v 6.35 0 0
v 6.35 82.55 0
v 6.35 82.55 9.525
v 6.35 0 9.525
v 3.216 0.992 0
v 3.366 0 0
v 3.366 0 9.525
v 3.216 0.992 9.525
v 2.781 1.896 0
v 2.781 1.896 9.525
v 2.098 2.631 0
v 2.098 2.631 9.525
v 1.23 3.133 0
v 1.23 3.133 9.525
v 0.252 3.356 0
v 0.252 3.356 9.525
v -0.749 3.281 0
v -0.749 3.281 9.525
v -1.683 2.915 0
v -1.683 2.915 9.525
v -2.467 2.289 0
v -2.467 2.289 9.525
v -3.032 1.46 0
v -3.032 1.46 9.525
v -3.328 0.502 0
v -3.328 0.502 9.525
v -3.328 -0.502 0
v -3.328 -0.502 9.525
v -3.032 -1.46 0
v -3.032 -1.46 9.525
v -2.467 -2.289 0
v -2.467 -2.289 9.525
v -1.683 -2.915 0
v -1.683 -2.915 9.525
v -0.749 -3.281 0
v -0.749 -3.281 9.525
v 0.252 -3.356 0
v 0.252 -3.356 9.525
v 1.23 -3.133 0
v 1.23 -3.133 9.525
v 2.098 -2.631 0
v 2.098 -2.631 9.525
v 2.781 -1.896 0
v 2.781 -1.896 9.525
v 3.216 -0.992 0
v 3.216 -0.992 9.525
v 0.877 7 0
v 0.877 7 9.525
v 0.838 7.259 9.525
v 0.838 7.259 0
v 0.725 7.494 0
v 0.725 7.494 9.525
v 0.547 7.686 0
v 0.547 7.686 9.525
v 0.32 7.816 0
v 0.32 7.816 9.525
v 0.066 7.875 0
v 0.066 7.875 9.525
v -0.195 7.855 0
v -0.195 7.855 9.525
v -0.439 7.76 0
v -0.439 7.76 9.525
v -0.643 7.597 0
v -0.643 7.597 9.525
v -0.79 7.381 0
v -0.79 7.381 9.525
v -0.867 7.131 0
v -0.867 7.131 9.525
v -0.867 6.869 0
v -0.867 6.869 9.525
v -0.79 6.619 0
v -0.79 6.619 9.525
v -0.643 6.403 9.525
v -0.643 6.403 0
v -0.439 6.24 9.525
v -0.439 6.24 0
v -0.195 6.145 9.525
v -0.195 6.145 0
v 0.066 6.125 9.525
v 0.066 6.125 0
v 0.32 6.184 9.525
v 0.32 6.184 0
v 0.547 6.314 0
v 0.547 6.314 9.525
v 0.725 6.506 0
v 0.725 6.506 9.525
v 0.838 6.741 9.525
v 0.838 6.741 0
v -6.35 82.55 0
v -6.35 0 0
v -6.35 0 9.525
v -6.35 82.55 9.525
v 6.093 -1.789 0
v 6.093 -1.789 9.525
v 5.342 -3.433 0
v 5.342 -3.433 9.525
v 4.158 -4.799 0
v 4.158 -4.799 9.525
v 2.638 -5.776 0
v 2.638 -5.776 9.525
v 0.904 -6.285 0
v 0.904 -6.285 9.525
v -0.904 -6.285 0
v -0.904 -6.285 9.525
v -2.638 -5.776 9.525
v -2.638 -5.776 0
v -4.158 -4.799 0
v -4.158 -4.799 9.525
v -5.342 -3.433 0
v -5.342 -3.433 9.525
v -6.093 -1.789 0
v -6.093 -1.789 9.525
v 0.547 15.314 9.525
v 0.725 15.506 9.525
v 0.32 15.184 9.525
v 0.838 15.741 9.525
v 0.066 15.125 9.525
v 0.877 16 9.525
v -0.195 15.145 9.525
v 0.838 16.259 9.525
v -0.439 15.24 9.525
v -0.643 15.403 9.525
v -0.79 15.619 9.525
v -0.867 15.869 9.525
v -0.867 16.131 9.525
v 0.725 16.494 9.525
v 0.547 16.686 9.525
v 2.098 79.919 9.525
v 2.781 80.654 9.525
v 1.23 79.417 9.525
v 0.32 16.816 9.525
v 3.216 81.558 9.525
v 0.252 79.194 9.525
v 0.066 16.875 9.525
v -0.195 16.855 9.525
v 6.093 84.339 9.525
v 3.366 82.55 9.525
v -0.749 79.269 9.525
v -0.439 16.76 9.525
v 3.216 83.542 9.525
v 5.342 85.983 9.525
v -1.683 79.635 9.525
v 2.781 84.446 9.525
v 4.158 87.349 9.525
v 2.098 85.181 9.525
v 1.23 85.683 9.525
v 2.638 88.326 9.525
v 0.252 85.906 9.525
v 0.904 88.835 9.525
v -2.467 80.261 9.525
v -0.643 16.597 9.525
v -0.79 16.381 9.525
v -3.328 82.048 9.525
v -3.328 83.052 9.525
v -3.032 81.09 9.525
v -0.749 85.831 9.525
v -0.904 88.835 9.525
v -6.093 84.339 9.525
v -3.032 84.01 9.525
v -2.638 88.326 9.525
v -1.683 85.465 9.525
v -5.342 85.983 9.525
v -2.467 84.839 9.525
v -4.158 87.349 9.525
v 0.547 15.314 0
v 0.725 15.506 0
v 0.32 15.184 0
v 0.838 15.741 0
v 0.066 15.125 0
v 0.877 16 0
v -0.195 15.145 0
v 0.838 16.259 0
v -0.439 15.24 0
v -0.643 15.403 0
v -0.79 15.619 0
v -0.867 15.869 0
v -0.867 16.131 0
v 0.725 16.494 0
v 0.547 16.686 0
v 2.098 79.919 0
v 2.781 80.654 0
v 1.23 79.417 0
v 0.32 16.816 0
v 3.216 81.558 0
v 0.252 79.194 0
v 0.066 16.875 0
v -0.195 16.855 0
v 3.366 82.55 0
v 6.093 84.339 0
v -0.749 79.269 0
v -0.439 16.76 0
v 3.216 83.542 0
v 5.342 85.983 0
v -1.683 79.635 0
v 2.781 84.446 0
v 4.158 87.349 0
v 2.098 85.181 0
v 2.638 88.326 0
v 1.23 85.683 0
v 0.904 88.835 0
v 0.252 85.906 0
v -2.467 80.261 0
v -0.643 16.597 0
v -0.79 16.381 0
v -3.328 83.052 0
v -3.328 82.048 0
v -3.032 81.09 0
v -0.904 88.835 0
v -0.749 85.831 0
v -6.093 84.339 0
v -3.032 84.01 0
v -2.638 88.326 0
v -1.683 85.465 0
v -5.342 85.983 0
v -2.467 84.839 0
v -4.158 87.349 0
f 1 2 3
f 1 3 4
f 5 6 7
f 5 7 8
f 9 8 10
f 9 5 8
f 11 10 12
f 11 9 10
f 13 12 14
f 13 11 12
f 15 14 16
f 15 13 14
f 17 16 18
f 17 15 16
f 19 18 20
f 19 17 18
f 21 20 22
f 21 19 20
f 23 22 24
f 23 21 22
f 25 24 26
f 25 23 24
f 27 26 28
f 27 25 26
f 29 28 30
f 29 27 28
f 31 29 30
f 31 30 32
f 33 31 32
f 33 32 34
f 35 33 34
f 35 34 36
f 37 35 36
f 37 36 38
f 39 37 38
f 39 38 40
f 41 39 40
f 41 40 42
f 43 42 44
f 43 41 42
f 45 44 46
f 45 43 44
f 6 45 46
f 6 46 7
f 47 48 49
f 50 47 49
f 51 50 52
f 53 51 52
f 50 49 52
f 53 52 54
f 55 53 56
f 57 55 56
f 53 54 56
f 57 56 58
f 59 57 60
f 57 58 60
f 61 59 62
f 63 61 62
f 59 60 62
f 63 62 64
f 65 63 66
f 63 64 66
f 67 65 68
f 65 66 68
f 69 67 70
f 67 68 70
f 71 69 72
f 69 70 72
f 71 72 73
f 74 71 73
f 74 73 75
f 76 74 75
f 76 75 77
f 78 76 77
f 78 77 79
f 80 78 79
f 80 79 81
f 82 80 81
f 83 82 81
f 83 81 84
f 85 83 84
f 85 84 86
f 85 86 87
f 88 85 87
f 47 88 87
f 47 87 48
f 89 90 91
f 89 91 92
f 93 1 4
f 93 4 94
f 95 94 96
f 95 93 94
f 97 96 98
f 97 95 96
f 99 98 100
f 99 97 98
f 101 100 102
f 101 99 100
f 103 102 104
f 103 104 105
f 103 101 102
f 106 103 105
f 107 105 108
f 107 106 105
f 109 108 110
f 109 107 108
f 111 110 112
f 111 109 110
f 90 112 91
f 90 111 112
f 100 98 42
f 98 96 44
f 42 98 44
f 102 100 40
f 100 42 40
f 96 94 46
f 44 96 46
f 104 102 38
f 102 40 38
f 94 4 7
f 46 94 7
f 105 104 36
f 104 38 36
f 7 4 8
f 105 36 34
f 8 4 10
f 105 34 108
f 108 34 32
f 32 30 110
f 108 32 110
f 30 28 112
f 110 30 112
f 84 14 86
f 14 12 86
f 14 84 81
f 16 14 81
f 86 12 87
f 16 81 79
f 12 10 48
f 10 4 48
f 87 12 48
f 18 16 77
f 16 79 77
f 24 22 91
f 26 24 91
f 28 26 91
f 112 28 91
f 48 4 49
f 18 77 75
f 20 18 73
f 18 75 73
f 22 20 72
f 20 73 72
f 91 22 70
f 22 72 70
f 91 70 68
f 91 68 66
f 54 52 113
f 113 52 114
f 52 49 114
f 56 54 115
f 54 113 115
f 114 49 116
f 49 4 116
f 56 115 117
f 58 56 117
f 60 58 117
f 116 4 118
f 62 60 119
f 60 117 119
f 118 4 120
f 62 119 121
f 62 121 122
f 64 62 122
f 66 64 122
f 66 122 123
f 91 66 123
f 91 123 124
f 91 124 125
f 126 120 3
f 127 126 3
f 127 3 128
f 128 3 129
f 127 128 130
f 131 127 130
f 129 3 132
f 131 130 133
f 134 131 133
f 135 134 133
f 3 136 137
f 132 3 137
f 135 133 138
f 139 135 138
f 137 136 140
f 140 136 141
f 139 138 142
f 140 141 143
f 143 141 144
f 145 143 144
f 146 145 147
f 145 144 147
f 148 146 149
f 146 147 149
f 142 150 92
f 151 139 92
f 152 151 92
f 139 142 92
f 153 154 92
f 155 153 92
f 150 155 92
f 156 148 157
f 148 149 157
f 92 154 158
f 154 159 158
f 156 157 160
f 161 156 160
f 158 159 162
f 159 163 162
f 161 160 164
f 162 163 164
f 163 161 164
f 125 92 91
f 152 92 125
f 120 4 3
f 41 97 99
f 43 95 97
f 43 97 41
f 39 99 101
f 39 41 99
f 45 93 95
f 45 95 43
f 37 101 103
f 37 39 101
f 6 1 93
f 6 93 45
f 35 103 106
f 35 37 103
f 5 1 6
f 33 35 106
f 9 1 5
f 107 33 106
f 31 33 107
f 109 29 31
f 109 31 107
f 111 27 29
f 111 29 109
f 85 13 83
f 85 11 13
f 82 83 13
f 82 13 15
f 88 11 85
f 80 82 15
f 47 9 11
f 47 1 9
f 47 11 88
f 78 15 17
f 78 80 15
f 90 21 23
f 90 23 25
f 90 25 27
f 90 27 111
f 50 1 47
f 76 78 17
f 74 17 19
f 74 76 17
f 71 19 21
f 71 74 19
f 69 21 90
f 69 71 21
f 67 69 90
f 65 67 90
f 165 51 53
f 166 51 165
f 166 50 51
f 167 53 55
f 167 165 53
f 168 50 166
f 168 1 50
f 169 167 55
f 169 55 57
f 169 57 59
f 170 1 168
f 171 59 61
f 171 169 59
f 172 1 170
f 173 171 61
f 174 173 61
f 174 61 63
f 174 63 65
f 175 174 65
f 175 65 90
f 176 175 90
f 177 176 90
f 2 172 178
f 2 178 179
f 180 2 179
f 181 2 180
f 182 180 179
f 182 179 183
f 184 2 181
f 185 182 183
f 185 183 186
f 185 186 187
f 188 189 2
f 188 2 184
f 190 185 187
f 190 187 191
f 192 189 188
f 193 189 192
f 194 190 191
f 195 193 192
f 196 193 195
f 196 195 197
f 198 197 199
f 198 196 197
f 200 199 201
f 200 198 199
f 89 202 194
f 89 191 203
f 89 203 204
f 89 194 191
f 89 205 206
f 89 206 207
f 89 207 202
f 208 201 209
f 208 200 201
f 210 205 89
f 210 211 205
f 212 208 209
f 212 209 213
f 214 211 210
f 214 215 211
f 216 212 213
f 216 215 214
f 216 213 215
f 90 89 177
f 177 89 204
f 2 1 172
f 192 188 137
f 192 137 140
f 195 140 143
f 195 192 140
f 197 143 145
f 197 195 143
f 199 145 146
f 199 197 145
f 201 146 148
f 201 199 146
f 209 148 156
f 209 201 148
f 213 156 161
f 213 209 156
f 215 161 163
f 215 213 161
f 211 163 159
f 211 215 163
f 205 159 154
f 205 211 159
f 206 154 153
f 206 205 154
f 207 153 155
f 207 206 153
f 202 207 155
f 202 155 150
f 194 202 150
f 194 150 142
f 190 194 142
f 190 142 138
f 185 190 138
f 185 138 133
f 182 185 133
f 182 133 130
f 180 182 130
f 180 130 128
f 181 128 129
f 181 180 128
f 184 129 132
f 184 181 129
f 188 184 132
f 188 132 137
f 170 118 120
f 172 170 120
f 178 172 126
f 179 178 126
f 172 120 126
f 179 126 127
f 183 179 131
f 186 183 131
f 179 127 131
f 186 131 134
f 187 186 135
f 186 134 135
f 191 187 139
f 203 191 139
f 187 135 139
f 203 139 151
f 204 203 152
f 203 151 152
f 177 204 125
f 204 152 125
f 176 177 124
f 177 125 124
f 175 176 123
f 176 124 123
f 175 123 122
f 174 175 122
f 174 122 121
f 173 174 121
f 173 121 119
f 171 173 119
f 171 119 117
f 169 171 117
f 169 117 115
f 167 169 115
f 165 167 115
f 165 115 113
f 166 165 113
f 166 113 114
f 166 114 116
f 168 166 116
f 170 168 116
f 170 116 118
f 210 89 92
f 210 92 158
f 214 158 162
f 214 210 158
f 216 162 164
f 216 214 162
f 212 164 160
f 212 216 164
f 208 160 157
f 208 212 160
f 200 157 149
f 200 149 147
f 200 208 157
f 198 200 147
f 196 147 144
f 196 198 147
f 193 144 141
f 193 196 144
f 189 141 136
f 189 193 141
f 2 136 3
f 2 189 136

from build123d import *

# Parameters (mm, degrees)
SKETCH1_R           = 3.3655
BOSS_EXTRUDE1_DEPTH = 9.525
SKETCH2_R           = 0.877000024
CUT_EXTRUDE1_DEPTH  = 10.525


with BuildPart() as part:
    # Sketch1 → Boss-Extrude1 (new body)
    with BuildSketch(Plane.XY):
        with BuildLine():
            Line((-6.35, 0), (-6.35, 82.55))
            ThreePointArc((-6.35, 82.55), (0, 88.9), (6.35, 82.55))
            Line((6.35, 82.55), (6.35, 0))
            ThreePointArc((6.35, 0), (0, -6.35), (-6.35, 0))
        make_face()
        with Locations((0, 82.55)):
            Circle(SKETCH1_R, mode=Mode.SUBTRACT)
        Circle(SKETCH1_R, mode=Mode.SUBTRACT)
    extrude(amount=BOSS_EXTRUDE1_DEPTH)

    # Sketch2 → Cut-Extrude1 (cut, through all)
    with BuildSketch(Plane.XY.offset(9.525)):
        with Locations((0, 6.99999997)):
            Circle(SKETCH2_R)
        with Locations((0, 16.000000004)):
            Circle(SKETCH2_R)
    extrude(amount=-CUT_EXTRUDE1_DEPTH, mode=Mode.SUBTRACT)


solid = part.part
